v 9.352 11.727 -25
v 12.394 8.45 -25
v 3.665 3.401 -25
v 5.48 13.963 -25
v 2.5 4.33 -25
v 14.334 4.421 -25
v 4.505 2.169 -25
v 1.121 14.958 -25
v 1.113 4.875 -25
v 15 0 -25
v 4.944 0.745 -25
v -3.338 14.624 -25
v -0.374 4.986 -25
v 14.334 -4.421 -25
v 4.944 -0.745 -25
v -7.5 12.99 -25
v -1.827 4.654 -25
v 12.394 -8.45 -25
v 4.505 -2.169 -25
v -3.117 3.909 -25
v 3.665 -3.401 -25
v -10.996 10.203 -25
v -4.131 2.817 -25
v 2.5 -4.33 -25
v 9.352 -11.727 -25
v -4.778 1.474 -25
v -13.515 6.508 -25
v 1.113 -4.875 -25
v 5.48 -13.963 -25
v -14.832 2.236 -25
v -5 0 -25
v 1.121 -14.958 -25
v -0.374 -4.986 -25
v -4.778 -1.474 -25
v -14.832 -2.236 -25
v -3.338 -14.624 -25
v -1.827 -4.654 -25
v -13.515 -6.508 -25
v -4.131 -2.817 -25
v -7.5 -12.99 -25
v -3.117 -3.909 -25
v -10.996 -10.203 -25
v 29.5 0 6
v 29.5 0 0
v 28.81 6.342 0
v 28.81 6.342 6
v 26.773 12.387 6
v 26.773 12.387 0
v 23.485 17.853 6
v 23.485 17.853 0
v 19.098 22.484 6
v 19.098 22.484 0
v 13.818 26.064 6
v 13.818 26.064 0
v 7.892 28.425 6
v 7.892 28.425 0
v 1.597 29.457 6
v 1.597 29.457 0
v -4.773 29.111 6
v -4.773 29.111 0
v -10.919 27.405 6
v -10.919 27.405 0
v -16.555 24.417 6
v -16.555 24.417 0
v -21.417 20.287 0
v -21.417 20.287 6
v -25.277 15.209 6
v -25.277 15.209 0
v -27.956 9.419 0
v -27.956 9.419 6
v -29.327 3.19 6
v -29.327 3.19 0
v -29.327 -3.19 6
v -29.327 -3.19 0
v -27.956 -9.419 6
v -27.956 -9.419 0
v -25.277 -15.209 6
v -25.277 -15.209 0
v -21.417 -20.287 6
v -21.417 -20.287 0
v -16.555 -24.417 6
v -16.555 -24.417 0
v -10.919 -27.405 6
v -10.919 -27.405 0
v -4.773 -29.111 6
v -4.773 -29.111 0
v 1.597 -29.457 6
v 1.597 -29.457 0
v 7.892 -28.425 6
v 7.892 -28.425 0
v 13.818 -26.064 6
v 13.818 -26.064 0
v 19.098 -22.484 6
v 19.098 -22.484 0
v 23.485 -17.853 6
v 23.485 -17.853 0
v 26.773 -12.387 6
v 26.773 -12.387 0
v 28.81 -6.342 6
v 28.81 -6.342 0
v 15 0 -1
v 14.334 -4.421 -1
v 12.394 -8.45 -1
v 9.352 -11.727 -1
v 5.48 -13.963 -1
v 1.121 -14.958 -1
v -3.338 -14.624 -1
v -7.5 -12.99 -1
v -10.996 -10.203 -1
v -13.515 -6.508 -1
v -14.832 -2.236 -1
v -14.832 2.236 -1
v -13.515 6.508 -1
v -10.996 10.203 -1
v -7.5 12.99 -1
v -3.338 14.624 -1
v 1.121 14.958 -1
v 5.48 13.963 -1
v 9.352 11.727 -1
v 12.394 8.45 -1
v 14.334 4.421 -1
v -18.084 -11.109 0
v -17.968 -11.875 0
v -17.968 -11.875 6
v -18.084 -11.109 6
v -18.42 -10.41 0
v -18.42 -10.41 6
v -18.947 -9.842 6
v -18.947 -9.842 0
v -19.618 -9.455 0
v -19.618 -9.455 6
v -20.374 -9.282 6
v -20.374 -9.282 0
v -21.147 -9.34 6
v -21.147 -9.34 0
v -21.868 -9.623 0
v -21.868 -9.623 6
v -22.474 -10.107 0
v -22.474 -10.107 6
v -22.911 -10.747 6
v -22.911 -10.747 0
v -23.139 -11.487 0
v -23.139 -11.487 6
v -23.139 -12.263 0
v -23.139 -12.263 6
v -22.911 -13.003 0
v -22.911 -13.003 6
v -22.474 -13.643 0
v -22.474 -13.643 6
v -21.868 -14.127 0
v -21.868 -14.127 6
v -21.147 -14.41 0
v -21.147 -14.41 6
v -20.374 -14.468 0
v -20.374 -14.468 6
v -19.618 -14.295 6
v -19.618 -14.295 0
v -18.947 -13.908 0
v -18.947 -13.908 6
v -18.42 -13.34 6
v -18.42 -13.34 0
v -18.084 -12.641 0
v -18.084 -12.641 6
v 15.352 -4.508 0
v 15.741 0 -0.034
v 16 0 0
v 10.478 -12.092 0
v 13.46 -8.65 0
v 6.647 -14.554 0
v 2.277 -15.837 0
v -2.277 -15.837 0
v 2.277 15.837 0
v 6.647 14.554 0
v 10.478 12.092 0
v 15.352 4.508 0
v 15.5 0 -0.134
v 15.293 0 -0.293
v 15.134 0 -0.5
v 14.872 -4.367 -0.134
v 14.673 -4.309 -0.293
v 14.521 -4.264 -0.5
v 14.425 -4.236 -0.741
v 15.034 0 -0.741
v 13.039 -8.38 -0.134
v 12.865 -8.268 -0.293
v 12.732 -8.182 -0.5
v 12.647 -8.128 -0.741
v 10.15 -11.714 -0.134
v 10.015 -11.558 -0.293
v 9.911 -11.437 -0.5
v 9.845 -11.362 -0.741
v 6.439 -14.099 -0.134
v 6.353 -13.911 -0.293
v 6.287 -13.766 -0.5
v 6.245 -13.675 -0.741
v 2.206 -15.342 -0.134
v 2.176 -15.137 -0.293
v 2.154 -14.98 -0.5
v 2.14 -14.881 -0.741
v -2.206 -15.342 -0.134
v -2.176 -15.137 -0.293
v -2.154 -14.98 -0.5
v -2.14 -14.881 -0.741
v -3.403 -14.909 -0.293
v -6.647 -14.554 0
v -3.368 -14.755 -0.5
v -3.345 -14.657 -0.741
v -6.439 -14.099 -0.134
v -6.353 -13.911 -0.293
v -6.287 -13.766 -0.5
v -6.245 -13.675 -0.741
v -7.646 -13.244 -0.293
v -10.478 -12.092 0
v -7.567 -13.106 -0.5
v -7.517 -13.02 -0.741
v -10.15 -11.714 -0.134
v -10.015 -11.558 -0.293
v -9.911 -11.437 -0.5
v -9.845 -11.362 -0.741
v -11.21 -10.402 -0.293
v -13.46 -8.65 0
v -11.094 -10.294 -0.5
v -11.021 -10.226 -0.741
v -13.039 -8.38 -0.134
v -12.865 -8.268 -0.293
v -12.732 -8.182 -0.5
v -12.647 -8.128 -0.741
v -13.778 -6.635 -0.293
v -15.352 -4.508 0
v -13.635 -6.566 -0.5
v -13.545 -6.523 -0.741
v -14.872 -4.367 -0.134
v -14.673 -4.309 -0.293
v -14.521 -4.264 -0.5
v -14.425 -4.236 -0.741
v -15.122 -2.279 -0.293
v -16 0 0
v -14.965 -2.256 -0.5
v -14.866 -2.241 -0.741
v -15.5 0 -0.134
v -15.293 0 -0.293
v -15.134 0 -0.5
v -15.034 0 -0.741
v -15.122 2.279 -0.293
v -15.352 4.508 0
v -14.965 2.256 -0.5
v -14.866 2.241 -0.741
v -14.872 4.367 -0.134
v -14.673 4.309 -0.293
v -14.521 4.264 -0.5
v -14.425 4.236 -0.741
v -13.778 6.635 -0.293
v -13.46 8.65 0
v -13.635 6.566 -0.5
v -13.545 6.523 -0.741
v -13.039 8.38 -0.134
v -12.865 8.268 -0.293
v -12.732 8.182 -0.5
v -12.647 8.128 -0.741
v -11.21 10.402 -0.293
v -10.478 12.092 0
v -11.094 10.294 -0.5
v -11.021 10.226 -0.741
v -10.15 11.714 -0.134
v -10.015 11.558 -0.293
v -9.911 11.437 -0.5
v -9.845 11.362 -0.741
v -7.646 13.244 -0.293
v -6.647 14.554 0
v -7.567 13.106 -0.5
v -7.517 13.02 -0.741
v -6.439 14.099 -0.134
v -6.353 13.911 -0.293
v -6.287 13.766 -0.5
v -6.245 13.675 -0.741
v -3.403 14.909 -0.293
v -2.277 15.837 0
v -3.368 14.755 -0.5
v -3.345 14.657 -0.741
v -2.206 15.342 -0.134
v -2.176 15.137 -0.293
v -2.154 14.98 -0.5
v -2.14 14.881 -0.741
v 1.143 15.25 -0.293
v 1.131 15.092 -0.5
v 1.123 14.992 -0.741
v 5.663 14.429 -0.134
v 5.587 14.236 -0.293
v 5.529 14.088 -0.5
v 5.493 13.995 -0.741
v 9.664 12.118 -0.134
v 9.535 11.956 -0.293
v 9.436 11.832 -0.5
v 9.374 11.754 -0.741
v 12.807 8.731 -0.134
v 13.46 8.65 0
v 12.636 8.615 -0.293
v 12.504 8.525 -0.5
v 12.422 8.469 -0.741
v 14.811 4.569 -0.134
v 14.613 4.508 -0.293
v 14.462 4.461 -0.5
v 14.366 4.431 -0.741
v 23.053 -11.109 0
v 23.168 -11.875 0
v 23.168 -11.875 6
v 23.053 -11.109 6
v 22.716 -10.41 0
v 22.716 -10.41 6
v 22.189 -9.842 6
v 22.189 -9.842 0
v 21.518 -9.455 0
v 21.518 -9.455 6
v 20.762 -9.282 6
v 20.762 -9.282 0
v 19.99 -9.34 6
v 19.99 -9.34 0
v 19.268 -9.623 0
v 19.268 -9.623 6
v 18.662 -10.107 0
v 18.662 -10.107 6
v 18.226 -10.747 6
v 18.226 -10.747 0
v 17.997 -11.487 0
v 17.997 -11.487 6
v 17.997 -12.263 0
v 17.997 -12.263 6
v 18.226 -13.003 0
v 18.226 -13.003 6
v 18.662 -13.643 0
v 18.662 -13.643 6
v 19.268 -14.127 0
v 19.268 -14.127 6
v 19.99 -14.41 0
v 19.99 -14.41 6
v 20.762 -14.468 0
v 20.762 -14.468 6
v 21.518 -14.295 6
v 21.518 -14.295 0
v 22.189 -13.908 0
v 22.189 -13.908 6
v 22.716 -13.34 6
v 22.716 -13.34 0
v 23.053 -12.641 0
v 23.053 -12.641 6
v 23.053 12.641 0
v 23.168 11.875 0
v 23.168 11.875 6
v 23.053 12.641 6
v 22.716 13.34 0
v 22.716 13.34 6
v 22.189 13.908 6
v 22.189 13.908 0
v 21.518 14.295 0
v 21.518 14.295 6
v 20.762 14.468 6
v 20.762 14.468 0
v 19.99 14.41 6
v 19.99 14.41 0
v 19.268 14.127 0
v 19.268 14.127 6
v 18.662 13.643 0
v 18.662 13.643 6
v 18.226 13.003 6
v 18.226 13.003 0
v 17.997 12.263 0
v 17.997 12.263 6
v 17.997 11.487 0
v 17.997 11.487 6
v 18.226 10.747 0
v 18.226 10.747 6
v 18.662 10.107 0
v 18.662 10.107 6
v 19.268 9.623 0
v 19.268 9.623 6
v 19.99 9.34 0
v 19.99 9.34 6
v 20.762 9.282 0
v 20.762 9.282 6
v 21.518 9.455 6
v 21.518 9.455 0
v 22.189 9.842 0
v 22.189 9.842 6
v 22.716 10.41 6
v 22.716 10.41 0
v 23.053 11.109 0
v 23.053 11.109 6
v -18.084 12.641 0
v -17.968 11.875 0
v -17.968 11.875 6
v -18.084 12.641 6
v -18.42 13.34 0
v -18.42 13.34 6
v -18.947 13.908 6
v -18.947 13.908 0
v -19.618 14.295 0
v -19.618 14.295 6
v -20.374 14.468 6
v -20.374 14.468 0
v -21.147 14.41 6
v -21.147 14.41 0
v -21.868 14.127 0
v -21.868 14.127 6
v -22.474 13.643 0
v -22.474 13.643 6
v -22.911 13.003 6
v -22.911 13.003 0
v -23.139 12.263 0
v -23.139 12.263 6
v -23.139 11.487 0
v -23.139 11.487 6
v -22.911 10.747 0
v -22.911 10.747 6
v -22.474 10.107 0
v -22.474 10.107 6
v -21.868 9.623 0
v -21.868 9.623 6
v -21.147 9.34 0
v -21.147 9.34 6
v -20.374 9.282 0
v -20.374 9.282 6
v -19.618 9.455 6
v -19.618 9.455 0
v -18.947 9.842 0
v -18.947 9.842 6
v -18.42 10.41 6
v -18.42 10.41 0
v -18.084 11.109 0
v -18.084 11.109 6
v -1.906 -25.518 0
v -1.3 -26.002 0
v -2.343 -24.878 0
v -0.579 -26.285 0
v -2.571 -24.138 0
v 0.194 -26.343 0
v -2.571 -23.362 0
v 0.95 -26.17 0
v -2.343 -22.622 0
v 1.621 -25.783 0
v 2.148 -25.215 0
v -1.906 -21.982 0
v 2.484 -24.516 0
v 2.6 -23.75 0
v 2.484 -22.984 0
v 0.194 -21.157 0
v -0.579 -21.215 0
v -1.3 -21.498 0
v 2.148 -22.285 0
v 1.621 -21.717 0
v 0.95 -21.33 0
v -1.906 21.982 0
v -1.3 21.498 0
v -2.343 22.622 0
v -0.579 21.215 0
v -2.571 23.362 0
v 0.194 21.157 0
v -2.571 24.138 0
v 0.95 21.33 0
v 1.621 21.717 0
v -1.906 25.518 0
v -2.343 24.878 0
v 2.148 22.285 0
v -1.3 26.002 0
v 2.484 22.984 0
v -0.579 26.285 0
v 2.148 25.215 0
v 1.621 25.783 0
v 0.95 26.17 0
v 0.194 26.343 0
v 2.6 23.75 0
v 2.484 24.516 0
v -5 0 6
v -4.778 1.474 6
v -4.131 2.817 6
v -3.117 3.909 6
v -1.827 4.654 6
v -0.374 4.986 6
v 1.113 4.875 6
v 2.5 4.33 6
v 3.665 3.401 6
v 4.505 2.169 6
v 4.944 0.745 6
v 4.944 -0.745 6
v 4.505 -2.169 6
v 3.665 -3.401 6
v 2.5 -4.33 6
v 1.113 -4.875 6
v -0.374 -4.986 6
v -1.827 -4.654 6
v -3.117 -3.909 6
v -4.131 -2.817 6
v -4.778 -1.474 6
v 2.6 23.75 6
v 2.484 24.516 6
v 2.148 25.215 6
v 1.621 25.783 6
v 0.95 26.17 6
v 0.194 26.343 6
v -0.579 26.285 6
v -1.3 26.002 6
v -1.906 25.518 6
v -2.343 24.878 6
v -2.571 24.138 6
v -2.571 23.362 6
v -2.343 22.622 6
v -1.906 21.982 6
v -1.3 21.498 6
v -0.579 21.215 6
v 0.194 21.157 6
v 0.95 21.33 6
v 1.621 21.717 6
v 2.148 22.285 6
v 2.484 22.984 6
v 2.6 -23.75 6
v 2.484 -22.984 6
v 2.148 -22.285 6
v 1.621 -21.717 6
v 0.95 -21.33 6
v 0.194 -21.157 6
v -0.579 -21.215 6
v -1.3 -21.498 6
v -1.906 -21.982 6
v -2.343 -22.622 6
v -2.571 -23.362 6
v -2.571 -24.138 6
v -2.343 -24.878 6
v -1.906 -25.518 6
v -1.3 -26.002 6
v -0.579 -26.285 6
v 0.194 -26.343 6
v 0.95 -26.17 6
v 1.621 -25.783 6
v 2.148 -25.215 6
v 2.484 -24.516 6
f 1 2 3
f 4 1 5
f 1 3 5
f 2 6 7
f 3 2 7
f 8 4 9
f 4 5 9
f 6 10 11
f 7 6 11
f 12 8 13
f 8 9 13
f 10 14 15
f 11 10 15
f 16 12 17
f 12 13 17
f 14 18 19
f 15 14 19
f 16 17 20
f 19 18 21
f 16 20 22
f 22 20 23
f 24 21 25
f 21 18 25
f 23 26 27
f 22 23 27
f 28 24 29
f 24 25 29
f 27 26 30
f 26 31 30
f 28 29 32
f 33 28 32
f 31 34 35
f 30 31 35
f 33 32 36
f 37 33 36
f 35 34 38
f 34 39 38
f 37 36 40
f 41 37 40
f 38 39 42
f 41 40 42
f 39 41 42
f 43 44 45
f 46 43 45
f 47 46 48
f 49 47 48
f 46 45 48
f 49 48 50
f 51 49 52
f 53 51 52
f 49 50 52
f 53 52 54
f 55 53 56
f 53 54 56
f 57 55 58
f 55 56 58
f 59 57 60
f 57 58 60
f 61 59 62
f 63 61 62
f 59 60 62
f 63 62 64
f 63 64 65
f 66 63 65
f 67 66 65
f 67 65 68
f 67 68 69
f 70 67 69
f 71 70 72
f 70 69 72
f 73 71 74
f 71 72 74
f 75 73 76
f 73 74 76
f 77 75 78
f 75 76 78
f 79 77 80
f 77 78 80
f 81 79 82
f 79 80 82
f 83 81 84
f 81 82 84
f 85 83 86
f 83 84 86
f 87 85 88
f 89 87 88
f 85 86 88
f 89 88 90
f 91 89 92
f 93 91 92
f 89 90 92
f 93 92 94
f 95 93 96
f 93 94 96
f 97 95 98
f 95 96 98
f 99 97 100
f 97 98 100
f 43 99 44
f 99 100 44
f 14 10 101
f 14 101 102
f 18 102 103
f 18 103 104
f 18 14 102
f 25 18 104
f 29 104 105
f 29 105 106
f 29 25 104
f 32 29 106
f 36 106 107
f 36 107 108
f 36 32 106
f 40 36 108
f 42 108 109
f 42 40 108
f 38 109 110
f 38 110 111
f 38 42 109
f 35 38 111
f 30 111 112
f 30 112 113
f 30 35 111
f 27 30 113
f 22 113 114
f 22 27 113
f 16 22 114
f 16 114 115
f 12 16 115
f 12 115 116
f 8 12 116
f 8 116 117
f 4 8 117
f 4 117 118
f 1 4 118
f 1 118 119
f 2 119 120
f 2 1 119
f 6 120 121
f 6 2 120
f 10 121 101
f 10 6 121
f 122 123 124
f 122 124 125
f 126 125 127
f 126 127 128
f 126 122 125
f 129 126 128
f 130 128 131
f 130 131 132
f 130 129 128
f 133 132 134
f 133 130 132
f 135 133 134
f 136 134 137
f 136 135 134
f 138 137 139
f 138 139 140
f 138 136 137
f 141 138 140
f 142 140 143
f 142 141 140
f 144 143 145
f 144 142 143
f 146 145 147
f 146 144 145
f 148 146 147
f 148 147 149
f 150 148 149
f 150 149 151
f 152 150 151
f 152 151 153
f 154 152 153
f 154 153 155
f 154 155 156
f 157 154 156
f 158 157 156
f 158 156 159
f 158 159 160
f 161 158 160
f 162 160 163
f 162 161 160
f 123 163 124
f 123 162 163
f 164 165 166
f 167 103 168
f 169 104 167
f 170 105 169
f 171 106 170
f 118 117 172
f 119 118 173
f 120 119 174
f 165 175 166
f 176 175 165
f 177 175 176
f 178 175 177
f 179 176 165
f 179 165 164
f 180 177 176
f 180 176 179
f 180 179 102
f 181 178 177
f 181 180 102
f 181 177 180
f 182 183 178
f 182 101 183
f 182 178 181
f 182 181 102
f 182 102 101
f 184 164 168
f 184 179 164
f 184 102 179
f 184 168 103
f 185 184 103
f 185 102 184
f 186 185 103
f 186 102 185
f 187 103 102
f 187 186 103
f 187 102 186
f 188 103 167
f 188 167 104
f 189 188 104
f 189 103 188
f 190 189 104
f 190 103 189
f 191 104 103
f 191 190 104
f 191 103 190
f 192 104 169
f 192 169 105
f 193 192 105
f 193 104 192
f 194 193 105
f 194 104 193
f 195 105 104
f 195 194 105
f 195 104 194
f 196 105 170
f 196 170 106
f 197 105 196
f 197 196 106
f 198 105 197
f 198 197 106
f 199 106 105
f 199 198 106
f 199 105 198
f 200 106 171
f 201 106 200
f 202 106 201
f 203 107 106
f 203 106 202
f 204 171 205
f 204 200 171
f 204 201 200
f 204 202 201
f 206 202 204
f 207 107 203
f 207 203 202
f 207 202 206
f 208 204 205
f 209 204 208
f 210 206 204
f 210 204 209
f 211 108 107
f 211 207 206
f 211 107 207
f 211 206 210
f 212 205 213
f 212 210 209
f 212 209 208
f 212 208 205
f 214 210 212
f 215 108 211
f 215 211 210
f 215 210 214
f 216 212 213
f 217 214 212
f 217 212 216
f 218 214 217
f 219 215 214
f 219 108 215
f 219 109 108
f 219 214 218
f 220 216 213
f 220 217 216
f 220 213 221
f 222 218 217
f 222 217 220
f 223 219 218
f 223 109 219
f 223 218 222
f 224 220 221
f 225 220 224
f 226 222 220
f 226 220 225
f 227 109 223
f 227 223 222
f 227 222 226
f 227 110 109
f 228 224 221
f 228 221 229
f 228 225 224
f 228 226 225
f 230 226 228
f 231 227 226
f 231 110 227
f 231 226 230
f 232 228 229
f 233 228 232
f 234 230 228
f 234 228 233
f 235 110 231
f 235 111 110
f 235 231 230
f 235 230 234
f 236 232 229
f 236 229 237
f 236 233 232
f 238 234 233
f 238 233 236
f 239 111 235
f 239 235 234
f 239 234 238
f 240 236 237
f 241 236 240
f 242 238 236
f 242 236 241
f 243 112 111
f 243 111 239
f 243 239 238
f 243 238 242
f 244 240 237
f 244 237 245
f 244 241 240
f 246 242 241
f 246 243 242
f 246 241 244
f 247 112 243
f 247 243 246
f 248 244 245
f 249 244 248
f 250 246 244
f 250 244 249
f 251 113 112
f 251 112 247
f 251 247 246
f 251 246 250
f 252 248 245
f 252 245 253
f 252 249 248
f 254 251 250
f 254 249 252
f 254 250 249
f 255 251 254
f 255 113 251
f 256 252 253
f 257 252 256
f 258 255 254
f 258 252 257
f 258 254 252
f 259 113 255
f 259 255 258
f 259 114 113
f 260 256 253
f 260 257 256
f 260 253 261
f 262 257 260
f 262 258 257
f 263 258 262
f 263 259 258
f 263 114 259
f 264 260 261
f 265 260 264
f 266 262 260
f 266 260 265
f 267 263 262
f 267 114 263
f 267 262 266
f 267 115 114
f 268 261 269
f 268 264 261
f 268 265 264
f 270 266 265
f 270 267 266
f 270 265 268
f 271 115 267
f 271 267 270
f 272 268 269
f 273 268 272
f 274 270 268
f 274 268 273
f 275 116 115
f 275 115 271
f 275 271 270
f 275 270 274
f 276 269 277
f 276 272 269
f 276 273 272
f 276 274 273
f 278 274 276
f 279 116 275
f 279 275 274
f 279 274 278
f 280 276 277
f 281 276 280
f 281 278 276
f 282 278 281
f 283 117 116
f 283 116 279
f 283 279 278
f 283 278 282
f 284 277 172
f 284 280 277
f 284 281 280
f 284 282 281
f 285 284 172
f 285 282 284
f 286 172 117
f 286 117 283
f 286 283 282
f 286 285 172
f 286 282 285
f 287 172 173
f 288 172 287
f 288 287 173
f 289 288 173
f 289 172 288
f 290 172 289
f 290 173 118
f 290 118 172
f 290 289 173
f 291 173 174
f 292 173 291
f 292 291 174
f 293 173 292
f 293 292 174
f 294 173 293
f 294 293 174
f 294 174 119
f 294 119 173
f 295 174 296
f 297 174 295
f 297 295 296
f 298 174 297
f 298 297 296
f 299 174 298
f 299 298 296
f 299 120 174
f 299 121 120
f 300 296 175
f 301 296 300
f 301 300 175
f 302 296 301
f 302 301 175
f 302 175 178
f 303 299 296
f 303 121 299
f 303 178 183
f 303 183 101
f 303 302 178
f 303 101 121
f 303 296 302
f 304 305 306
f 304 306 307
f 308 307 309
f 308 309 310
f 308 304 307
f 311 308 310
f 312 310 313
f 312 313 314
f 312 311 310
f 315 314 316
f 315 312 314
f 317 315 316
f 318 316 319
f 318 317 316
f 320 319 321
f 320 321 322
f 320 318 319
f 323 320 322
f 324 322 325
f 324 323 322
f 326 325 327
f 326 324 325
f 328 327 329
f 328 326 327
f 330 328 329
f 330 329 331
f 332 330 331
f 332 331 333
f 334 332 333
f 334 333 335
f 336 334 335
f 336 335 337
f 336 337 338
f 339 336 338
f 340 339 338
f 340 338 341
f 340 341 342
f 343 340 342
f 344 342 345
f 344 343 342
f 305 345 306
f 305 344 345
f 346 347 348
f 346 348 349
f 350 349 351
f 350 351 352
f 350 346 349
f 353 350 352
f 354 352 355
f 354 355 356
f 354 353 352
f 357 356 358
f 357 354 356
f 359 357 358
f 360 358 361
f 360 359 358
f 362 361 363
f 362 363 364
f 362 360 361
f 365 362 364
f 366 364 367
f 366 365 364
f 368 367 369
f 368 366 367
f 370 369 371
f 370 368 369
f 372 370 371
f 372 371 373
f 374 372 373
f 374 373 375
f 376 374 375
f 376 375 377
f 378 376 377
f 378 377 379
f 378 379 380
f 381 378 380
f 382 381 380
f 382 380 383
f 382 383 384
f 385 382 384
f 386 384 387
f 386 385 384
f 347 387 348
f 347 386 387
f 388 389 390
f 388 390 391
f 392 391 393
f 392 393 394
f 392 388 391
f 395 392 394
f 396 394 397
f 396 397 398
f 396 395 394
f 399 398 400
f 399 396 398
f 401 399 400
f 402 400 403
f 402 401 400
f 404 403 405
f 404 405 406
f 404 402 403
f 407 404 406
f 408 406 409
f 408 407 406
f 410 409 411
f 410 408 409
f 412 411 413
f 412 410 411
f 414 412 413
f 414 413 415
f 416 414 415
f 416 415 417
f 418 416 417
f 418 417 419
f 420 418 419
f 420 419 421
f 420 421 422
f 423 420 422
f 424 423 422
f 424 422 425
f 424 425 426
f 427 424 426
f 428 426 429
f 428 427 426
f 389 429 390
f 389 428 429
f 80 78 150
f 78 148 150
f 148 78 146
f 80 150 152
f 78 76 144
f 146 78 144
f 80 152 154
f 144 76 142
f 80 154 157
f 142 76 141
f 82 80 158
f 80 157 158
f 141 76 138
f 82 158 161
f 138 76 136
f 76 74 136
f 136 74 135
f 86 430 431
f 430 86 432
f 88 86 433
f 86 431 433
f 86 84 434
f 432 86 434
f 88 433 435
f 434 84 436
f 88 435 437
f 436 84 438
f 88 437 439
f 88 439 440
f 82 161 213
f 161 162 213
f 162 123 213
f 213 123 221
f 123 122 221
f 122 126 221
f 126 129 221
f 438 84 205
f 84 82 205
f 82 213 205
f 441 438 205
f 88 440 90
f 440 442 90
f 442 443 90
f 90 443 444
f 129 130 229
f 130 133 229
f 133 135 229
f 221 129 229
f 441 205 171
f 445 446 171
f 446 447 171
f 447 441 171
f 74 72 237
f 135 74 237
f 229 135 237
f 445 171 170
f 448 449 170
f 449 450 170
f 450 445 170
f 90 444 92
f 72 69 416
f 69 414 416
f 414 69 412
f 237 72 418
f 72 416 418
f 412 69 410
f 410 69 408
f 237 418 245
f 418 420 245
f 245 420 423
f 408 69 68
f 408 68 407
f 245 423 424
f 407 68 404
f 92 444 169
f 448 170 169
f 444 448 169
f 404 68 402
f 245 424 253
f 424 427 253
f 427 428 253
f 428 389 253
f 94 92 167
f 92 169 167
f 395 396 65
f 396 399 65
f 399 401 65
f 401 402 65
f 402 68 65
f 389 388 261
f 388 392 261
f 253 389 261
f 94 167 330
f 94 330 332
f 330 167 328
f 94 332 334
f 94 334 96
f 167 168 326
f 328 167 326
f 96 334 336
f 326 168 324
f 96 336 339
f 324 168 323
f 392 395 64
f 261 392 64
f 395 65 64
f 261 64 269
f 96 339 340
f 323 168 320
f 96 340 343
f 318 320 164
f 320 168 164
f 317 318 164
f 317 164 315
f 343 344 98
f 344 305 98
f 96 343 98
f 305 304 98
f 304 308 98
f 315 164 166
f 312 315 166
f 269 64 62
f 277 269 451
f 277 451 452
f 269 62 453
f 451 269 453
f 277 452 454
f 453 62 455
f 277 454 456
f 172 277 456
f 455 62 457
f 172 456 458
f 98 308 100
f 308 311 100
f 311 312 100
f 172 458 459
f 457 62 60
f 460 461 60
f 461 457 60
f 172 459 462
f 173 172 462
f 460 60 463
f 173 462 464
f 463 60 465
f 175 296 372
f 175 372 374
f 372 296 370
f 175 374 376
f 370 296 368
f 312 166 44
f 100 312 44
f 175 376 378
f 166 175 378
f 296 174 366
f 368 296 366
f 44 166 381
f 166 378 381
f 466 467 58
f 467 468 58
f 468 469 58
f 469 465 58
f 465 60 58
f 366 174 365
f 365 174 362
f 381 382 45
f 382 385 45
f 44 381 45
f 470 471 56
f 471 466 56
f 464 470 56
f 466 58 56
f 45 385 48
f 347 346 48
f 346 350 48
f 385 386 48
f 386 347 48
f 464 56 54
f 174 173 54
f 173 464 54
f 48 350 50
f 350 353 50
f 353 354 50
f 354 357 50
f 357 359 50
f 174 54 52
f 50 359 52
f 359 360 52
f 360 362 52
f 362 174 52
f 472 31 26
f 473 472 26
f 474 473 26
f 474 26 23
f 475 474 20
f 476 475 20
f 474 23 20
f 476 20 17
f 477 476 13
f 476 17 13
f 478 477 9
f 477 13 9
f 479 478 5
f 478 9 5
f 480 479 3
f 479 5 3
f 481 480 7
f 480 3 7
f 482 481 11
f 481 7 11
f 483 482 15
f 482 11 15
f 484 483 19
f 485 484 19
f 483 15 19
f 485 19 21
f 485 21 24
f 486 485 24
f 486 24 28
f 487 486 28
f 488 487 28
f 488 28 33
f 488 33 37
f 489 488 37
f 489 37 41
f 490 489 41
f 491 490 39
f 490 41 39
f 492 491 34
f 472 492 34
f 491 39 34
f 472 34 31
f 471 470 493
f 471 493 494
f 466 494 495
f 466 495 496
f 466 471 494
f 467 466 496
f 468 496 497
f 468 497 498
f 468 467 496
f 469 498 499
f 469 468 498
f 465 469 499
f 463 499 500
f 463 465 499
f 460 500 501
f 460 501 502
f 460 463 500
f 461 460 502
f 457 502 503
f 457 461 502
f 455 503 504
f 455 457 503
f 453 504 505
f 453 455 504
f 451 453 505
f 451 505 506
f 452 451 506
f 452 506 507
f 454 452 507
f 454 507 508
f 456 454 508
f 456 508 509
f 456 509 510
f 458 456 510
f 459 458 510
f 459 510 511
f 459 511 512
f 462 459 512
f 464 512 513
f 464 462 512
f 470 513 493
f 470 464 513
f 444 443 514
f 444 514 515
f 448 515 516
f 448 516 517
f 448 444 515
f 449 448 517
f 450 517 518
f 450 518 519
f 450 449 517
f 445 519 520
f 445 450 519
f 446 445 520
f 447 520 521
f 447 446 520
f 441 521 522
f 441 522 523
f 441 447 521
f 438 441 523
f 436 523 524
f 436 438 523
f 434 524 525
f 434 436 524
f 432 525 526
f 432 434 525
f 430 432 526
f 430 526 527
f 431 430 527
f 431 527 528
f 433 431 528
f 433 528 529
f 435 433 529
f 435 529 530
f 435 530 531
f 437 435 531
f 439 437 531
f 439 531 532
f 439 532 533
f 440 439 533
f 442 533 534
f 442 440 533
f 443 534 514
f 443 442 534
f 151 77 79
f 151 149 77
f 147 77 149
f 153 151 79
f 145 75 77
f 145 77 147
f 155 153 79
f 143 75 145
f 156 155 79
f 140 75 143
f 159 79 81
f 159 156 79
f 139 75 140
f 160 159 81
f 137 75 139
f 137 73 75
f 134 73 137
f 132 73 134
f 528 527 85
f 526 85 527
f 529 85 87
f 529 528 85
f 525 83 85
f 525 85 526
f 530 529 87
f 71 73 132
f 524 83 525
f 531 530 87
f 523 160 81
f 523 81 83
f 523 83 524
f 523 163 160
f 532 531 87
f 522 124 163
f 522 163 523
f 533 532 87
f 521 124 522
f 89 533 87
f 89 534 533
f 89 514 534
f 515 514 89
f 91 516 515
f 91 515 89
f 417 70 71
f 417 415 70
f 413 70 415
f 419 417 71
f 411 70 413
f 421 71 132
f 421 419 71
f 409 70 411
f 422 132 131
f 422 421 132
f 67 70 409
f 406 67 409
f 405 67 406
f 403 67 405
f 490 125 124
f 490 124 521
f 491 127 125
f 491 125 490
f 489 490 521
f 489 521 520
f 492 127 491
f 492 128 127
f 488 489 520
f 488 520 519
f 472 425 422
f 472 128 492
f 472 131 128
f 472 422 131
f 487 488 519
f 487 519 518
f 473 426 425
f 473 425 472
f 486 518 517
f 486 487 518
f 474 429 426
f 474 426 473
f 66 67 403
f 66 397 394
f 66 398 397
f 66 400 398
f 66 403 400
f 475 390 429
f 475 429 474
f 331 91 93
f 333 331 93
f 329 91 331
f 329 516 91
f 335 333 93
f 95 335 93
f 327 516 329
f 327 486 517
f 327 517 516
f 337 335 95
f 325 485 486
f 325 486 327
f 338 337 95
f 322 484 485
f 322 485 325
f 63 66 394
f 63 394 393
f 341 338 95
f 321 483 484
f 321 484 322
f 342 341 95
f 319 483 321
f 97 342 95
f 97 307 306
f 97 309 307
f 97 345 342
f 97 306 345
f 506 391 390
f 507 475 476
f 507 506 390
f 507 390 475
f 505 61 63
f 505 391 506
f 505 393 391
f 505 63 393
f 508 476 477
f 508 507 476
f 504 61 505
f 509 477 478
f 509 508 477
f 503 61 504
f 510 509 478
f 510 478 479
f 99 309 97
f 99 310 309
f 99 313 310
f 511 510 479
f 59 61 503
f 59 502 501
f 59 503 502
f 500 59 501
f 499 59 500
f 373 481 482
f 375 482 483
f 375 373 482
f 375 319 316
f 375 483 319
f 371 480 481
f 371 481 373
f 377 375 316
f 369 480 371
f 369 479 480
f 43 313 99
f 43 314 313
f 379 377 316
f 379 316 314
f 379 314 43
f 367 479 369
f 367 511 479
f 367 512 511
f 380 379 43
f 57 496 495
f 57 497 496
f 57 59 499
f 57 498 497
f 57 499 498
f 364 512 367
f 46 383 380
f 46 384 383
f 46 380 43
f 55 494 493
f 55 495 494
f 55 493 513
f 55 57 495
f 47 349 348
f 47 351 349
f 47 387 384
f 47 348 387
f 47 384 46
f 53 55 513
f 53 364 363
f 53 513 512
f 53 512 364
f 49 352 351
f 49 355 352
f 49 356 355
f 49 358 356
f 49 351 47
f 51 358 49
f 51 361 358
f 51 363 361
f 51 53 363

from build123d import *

# Parameters (mm, degrees)
SKETCH1_R           = 29.5
SKETCH1_R_2         = 2.6
BOSS_EXTRUDE1_DEPTH = 6
SKETCH2_W           = 25
SKETCH2_H           = 15
FILLET1_R           = 1
SKETCH3_R           = 5
CUT_EXTRUDE1_DEPTH  = 31


with BuildPart() as part:
    # Sketch1 → Boss-Extrude1 (new body)
    with BuildSketch(Plane.XY):
        Circle(SKETCH1_R)
        with Locations((0, 23.75)):
            Circle(SKETCH1_R_2, mode=Mode.SUBTRACT)
        with Locations((20.56810334, 11.875)):
            Circle(SKETCH1_R_2, mode=Mode.SUBTRACT)
        with Locations((20.56810334, -11.875)):
            Circle(SKETCH1_R_2, mode=Mode.SUBTRACT)
        with Locations((0, -23.75)):
            Circle(SKETCH1_R_2, mode=Mode.SUBTRACT)
        with Locations((-20.56810334, -11.875)):
            Circle(SKETCH1_R_2, mode=Mode.SUBTRACT)
        with Locations((-20.56810334, 11.875)):
            Circle(SKETCH1_R_2, mode=Mode.SUBTRACT)
    extrude(amount=BOSS_EXTRUDE1_DEPTH)

    # Sketch2 → Revolve1 (revolve)
    with BuildSketch(Plane(origin=(0, 0, 0), x_dir=(0, 0, -1), z_dir=(1, 0, 0)), mode=Mode.PRIVATE) as revolve1_sk:
        with Locations((12.5, 7.5)):
            Rectangle(SKETCH2_W, SKETCH2_H)
    revolve(revolve1_sk.sketch.rotate(Axis((0, 0, 0), (0, 0, -1)), 90), axis=Axis((0, 0, 0), (0, 0, -1)))

    # Fillet1
    fillet1_edges = [part.edges().sort_by_distance(p)[0] for p in [
        (-15, 0, 0),
    ]]
    fillet(fillet1_edges, radius=FILLET1_R)

    # Sketch3 → Cut-Extrude1 (cut)
    with BuildSketch(Plane(origin=(0, 0, -25), x_dir=(-1, 0, 0), z_dir=(0, 0, -1))):
        Circle(SKETCH3_R)
    extrude(amount=-CUT_EXTRUDE1_DEPTH, mode=Mode.SUBTRACT)


solid = part.part
